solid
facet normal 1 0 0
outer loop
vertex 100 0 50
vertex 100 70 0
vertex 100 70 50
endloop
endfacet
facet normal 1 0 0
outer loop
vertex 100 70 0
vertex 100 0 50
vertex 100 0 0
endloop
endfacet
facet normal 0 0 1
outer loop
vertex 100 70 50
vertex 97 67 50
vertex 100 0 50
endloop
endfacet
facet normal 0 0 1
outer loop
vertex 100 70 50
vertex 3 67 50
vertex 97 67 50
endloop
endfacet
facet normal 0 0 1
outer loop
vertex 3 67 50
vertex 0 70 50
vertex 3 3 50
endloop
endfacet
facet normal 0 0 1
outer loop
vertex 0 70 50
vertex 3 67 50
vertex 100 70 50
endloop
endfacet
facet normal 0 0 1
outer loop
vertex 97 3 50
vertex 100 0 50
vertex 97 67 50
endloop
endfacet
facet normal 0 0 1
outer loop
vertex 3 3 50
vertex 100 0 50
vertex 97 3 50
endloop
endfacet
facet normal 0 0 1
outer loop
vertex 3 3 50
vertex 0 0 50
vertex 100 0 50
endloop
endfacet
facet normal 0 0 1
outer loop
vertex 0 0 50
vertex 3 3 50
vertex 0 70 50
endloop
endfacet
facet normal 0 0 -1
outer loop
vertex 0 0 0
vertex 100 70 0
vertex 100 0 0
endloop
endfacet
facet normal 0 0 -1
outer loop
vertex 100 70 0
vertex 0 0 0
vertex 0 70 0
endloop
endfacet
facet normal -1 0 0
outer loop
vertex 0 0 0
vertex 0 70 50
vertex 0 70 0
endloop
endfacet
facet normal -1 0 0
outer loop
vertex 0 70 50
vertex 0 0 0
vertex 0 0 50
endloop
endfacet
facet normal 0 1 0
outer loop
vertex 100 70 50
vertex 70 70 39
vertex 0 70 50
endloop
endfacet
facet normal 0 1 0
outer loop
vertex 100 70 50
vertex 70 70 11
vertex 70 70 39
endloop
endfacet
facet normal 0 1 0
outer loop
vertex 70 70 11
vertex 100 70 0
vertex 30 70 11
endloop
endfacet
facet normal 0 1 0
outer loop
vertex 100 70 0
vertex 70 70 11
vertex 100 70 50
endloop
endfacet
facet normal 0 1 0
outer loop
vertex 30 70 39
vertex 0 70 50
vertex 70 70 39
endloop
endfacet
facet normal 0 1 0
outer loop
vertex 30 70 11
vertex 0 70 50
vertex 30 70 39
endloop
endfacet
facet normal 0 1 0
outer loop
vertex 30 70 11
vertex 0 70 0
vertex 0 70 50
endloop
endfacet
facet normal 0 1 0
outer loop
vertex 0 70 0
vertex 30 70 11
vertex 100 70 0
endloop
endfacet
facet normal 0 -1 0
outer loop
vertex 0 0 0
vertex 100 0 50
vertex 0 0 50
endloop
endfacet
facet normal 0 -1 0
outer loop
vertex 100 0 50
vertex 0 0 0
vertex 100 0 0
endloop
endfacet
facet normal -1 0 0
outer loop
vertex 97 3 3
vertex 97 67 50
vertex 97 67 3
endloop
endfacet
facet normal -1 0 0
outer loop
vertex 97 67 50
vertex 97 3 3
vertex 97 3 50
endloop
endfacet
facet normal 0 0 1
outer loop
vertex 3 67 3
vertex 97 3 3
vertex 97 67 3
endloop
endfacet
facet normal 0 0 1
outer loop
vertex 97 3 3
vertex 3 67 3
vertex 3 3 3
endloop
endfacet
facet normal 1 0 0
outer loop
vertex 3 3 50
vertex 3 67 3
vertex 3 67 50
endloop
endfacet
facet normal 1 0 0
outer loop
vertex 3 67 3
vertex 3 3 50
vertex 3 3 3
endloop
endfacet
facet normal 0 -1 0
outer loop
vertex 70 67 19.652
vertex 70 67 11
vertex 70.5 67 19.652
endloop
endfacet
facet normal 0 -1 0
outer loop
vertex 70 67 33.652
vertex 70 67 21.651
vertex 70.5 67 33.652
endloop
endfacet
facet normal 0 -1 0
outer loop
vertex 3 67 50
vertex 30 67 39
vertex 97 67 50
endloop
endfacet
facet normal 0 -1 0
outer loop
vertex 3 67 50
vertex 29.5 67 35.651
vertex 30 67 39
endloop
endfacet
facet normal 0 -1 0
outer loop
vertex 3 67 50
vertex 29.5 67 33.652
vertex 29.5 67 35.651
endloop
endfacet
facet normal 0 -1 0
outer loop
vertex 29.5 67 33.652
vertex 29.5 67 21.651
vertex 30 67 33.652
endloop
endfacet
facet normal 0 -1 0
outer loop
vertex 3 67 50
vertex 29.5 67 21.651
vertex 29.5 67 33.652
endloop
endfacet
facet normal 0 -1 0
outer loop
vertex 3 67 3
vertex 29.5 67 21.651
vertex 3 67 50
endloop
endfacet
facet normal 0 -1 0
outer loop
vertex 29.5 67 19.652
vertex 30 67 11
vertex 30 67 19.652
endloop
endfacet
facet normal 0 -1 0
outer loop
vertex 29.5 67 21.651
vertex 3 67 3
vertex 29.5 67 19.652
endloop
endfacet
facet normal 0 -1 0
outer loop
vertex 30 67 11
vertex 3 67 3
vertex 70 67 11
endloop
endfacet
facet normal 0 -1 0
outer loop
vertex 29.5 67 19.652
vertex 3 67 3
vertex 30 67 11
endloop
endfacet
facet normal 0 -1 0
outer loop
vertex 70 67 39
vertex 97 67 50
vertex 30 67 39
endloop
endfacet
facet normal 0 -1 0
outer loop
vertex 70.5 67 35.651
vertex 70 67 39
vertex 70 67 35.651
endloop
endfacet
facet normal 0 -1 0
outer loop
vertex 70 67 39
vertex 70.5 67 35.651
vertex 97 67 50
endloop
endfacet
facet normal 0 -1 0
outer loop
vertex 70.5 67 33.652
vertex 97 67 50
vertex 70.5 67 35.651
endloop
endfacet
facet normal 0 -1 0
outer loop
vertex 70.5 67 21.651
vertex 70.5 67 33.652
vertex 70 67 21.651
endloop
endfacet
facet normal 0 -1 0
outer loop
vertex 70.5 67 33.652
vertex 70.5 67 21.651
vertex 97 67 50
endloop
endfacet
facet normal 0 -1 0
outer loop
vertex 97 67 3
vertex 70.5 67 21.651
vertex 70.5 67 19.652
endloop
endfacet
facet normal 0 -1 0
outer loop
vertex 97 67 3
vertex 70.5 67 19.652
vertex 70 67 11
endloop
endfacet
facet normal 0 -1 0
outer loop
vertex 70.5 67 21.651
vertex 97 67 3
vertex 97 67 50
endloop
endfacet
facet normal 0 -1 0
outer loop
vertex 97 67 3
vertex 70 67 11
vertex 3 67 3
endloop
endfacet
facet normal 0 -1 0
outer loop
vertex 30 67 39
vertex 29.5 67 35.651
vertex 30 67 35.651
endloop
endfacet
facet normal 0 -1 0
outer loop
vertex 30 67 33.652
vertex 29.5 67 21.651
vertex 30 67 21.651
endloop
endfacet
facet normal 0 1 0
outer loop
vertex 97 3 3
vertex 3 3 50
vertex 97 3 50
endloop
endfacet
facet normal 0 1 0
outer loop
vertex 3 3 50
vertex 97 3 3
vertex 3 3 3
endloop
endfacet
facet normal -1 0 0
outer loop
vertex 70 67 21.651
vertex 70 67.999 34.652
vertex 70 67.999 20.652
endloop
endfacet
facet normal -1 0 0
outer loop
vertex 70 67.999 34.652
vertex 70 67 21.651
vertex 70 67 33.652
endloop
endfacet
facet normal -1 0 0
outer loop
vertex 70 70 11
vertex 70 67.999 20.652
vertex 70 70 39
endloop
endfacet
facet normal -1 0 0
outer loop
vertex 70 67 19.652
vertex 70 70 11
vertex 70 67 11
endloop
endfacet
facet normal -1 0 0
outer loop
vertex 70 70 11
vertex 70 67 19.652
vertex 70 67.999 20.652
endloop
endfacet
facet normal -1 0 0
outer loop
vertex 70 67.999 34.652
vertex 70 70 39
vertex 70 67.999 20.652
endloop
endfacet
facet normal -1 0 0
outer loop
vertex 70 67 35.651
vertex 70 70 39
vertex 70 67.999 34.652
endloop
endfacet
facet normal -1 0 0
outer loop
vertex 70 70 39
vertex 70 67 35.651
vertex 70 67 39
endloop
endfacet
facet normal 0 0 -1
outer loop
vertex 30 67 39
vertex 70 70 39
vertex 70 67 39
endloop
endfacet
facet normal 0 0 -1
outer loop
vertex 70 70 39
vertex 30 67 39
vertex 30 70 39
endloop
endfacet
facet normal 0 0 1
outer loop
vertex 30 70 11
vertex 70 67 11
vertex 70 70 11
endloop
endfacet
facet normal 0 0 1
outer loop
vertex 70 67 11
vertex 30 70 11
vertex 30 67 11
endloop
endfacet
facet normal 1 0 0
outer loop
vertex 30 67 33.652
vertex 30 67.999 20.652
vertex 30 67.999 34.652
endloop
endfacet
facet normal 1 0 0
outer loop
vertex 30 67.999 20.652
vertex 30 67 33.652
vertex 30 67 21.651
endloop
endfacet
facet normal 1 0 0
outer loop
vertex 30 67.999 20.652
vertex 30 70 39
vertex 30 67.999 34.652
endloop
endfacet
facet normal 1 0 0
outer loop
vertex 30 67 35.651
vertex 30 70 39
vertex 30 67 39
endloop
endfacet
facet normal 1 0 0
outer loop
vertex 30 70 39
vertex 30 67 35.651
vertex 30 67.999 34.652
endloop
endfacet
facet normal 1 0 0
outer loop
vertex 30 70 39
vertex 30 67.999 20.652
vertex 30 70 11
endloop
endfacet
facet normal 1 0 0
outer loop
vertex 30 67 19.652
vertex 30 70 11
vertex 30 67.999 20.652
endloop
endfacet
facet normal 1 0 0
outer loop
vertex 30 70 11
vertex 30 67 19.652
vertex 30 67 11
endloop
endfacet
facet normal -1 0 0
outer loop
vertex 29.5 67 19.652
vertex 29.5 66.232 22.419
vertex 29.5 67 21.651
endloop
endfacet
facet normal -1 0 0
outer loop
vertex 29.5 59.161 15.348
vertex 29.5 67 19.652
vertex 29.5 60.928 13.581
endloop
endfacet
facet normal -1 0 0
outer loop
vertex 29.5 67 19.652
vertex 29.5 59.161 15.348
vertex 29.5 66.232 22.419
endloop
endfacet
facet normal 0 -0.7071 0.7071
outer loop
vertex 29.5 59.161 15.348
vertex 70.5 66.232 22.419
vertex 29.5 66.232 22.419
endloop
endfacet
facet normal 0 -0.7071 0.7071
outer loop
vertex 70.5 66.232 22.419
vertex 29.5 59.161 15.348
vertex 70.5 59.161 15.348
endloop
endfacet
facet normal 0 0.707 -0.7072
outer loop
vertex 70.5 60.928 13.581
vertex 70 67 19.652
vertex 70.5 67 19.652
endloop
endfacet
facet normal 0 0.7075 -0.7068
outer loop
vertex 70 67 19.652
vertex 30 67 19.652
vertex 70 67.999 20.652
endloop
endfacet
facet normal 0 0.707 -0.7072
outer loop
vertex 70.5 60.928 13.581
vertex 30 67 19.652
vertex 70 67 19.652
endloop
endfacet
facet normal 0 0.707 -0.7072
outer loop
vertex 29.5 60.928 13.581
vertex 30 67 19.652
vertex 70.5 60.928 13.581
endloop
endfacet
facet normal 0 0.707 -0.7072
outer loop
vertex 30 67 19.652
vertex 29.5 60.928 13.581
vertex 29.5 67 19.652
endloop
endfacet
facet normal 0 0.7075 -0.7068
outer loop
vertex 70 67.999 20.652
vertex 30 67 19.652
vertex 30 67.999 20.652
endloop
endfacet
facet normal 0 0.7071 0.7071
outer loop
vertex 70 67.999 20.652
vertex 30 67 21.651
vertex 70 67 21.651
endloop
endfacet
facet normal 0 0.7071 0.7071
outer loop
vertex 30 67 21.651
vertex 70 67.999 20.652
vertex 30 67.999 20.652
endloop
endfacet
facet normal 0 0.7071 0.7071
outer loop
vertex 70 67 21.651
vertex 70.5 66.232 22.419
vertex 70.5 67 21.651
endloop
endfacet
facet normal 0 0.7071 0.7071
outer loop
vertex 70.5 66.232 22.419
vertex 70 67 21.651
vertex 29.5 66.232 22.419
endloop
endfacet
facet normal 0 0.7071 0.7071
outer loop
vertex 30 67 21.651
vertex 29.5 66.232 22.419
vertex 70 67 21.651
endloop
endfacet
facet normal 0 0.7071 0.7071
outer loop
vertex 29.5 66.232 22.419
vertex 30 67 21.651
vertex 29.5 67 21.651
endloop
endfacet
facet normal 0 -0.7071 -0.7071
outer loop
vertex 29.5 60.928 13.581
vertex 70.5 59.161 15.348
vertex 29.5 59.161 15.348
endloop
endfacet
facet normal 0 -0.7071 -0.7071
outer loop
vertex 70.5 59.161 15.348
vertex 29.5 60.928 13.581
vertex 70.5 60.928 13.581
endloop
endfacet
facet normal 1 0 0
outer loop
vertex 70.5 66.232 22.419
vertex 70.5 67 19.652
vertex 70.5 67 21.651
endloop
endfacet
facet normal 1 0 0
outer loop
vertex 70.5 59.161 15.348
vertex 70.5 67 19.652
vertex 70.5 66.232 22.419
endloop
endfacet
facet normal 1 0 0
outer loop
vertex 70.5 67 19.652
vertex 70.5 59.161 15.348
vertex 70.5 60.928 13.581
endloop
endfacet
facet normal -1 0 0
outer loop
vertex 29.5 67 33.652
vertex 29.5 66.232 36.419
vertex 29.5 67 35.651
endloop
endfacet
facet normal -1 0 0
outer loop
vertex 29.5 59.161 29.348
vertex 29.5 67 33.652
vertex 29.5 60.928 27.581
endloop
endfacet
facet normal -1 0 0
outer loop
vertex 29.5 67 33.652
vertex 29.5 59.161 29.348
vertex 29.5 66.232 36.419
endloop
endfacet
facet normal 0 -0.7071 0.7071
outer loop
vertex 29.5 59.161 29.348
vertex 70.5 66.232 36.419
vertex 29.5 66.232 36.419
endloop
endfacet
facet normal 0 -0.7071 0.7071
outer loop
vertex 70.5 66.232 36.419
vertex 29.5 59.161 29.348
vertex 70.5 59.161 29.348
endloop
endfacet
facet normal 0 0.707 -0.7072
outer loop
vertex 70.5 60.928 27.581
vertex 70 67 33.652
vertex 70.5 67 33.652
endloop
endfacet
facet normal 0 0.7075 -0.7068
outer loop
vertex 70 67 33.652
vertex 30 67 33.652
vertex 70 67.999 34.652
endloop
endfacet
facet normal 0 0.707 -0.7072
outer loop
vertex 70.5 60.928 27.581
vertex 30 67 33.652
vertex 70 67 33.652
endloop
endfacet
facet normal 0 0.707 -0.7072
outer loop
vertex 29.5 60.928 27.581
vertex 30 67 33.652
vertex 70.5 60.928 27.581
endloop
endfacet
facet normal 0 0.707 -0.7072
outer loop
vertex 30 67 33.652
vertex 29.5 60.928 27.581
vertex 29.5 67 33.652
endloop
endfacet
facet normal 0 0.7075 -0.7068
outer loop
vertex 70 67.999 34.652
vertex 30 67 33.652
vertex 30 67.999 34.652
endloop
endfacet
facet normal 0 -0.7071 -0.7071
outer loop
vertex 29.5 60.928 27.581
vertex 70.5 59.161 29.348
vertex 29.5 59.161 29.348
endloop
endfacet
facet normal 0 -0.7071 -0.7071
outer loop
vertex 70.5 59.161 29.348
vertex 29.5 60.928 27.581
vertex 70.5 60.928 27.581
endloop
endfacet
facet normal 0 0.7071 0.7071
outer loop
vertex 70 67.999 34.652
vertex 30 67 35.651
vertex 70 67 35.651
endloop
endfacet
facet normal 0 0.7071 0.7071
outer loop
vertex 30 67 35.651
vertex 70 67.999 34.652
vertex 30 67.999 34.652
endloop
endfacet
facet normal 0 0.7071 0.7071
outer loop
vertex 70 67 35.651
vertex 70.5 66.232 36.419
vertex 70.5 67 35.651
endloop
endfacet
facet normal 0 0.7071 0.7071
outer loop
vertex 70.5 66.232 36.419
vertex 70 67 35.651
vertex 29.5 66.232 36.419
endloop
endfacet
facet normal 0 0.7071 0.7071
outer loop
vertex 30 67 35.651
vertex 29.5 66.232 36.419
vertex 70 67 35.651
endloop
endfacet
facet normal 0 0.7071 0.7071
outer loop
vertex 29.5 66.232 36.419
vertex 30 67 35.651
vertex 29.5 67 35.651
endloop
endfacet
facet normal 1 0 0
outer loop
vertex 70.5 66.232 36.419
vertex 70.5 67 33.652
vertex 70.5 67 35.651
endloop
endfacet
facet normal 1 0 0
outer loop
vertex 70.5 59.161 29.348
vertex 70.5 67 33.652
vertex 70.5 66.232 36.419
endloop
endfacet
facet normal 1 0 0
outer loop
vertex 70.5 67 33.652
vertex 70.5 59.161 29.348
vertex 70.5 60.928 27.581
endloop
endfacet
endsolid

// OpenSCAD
$fn = 32;

// ----------------------------------------------------------------------
// Vent box: louvers enclosure
// ----------------------------------------------------------------------

// --- parameters (mm) ---
box_l = 100;              // box length, X
box_w = 70;               // box width, Y
box_h = 50;               // box height, Z
wall_t = 3;               // shell wall thickness
win_l = 40;               // vent window width, X
win_h = 28;               // vent window height, Z
slat_t = 2.5;             // louver slat thickness
slat_d = 10;              // louver slat depth
slat_a = 45;              // louver slat angle, degrees
slat_pitch = 14;          // louver pitch
slat_yc = 63.58;          // slat centreline Y
fit_tol = 0.05;           // tolerance for press fits, mm
free_tol = 0.2;           // tolerance for clearance fits, mm

win_z0 = (box_h - win_h) / 2;  // window lower edge Z
n_slats = 2;  // louver count
slat_z0 = win_z0 + (win_h - (n_slats - 1) * slat_pitch) / 2;

difference() {
  union() {
    difference() {
      cube([box_l, box_w, box_h]);
  translate([wall_t, wall_t, wall_t])
    cube([box_l - 2 * wall_t, box_w - 2 * wall_t, box_h]);
  translate([(box_l - win_l) / 2, box_w - wall_t - 1, win_z0])
    cube([win_l, wall_t + 2, win_h]);
    }
    for (i = [0 : n_slats - 1])
      translate([box_l / 2, slat_yc, slat_z0 + i * slat_pitch])
        rotate([slat_a, 0, 0])
          cube([win_l + 1, slat_d, slat_t], center = true);
  }
}
